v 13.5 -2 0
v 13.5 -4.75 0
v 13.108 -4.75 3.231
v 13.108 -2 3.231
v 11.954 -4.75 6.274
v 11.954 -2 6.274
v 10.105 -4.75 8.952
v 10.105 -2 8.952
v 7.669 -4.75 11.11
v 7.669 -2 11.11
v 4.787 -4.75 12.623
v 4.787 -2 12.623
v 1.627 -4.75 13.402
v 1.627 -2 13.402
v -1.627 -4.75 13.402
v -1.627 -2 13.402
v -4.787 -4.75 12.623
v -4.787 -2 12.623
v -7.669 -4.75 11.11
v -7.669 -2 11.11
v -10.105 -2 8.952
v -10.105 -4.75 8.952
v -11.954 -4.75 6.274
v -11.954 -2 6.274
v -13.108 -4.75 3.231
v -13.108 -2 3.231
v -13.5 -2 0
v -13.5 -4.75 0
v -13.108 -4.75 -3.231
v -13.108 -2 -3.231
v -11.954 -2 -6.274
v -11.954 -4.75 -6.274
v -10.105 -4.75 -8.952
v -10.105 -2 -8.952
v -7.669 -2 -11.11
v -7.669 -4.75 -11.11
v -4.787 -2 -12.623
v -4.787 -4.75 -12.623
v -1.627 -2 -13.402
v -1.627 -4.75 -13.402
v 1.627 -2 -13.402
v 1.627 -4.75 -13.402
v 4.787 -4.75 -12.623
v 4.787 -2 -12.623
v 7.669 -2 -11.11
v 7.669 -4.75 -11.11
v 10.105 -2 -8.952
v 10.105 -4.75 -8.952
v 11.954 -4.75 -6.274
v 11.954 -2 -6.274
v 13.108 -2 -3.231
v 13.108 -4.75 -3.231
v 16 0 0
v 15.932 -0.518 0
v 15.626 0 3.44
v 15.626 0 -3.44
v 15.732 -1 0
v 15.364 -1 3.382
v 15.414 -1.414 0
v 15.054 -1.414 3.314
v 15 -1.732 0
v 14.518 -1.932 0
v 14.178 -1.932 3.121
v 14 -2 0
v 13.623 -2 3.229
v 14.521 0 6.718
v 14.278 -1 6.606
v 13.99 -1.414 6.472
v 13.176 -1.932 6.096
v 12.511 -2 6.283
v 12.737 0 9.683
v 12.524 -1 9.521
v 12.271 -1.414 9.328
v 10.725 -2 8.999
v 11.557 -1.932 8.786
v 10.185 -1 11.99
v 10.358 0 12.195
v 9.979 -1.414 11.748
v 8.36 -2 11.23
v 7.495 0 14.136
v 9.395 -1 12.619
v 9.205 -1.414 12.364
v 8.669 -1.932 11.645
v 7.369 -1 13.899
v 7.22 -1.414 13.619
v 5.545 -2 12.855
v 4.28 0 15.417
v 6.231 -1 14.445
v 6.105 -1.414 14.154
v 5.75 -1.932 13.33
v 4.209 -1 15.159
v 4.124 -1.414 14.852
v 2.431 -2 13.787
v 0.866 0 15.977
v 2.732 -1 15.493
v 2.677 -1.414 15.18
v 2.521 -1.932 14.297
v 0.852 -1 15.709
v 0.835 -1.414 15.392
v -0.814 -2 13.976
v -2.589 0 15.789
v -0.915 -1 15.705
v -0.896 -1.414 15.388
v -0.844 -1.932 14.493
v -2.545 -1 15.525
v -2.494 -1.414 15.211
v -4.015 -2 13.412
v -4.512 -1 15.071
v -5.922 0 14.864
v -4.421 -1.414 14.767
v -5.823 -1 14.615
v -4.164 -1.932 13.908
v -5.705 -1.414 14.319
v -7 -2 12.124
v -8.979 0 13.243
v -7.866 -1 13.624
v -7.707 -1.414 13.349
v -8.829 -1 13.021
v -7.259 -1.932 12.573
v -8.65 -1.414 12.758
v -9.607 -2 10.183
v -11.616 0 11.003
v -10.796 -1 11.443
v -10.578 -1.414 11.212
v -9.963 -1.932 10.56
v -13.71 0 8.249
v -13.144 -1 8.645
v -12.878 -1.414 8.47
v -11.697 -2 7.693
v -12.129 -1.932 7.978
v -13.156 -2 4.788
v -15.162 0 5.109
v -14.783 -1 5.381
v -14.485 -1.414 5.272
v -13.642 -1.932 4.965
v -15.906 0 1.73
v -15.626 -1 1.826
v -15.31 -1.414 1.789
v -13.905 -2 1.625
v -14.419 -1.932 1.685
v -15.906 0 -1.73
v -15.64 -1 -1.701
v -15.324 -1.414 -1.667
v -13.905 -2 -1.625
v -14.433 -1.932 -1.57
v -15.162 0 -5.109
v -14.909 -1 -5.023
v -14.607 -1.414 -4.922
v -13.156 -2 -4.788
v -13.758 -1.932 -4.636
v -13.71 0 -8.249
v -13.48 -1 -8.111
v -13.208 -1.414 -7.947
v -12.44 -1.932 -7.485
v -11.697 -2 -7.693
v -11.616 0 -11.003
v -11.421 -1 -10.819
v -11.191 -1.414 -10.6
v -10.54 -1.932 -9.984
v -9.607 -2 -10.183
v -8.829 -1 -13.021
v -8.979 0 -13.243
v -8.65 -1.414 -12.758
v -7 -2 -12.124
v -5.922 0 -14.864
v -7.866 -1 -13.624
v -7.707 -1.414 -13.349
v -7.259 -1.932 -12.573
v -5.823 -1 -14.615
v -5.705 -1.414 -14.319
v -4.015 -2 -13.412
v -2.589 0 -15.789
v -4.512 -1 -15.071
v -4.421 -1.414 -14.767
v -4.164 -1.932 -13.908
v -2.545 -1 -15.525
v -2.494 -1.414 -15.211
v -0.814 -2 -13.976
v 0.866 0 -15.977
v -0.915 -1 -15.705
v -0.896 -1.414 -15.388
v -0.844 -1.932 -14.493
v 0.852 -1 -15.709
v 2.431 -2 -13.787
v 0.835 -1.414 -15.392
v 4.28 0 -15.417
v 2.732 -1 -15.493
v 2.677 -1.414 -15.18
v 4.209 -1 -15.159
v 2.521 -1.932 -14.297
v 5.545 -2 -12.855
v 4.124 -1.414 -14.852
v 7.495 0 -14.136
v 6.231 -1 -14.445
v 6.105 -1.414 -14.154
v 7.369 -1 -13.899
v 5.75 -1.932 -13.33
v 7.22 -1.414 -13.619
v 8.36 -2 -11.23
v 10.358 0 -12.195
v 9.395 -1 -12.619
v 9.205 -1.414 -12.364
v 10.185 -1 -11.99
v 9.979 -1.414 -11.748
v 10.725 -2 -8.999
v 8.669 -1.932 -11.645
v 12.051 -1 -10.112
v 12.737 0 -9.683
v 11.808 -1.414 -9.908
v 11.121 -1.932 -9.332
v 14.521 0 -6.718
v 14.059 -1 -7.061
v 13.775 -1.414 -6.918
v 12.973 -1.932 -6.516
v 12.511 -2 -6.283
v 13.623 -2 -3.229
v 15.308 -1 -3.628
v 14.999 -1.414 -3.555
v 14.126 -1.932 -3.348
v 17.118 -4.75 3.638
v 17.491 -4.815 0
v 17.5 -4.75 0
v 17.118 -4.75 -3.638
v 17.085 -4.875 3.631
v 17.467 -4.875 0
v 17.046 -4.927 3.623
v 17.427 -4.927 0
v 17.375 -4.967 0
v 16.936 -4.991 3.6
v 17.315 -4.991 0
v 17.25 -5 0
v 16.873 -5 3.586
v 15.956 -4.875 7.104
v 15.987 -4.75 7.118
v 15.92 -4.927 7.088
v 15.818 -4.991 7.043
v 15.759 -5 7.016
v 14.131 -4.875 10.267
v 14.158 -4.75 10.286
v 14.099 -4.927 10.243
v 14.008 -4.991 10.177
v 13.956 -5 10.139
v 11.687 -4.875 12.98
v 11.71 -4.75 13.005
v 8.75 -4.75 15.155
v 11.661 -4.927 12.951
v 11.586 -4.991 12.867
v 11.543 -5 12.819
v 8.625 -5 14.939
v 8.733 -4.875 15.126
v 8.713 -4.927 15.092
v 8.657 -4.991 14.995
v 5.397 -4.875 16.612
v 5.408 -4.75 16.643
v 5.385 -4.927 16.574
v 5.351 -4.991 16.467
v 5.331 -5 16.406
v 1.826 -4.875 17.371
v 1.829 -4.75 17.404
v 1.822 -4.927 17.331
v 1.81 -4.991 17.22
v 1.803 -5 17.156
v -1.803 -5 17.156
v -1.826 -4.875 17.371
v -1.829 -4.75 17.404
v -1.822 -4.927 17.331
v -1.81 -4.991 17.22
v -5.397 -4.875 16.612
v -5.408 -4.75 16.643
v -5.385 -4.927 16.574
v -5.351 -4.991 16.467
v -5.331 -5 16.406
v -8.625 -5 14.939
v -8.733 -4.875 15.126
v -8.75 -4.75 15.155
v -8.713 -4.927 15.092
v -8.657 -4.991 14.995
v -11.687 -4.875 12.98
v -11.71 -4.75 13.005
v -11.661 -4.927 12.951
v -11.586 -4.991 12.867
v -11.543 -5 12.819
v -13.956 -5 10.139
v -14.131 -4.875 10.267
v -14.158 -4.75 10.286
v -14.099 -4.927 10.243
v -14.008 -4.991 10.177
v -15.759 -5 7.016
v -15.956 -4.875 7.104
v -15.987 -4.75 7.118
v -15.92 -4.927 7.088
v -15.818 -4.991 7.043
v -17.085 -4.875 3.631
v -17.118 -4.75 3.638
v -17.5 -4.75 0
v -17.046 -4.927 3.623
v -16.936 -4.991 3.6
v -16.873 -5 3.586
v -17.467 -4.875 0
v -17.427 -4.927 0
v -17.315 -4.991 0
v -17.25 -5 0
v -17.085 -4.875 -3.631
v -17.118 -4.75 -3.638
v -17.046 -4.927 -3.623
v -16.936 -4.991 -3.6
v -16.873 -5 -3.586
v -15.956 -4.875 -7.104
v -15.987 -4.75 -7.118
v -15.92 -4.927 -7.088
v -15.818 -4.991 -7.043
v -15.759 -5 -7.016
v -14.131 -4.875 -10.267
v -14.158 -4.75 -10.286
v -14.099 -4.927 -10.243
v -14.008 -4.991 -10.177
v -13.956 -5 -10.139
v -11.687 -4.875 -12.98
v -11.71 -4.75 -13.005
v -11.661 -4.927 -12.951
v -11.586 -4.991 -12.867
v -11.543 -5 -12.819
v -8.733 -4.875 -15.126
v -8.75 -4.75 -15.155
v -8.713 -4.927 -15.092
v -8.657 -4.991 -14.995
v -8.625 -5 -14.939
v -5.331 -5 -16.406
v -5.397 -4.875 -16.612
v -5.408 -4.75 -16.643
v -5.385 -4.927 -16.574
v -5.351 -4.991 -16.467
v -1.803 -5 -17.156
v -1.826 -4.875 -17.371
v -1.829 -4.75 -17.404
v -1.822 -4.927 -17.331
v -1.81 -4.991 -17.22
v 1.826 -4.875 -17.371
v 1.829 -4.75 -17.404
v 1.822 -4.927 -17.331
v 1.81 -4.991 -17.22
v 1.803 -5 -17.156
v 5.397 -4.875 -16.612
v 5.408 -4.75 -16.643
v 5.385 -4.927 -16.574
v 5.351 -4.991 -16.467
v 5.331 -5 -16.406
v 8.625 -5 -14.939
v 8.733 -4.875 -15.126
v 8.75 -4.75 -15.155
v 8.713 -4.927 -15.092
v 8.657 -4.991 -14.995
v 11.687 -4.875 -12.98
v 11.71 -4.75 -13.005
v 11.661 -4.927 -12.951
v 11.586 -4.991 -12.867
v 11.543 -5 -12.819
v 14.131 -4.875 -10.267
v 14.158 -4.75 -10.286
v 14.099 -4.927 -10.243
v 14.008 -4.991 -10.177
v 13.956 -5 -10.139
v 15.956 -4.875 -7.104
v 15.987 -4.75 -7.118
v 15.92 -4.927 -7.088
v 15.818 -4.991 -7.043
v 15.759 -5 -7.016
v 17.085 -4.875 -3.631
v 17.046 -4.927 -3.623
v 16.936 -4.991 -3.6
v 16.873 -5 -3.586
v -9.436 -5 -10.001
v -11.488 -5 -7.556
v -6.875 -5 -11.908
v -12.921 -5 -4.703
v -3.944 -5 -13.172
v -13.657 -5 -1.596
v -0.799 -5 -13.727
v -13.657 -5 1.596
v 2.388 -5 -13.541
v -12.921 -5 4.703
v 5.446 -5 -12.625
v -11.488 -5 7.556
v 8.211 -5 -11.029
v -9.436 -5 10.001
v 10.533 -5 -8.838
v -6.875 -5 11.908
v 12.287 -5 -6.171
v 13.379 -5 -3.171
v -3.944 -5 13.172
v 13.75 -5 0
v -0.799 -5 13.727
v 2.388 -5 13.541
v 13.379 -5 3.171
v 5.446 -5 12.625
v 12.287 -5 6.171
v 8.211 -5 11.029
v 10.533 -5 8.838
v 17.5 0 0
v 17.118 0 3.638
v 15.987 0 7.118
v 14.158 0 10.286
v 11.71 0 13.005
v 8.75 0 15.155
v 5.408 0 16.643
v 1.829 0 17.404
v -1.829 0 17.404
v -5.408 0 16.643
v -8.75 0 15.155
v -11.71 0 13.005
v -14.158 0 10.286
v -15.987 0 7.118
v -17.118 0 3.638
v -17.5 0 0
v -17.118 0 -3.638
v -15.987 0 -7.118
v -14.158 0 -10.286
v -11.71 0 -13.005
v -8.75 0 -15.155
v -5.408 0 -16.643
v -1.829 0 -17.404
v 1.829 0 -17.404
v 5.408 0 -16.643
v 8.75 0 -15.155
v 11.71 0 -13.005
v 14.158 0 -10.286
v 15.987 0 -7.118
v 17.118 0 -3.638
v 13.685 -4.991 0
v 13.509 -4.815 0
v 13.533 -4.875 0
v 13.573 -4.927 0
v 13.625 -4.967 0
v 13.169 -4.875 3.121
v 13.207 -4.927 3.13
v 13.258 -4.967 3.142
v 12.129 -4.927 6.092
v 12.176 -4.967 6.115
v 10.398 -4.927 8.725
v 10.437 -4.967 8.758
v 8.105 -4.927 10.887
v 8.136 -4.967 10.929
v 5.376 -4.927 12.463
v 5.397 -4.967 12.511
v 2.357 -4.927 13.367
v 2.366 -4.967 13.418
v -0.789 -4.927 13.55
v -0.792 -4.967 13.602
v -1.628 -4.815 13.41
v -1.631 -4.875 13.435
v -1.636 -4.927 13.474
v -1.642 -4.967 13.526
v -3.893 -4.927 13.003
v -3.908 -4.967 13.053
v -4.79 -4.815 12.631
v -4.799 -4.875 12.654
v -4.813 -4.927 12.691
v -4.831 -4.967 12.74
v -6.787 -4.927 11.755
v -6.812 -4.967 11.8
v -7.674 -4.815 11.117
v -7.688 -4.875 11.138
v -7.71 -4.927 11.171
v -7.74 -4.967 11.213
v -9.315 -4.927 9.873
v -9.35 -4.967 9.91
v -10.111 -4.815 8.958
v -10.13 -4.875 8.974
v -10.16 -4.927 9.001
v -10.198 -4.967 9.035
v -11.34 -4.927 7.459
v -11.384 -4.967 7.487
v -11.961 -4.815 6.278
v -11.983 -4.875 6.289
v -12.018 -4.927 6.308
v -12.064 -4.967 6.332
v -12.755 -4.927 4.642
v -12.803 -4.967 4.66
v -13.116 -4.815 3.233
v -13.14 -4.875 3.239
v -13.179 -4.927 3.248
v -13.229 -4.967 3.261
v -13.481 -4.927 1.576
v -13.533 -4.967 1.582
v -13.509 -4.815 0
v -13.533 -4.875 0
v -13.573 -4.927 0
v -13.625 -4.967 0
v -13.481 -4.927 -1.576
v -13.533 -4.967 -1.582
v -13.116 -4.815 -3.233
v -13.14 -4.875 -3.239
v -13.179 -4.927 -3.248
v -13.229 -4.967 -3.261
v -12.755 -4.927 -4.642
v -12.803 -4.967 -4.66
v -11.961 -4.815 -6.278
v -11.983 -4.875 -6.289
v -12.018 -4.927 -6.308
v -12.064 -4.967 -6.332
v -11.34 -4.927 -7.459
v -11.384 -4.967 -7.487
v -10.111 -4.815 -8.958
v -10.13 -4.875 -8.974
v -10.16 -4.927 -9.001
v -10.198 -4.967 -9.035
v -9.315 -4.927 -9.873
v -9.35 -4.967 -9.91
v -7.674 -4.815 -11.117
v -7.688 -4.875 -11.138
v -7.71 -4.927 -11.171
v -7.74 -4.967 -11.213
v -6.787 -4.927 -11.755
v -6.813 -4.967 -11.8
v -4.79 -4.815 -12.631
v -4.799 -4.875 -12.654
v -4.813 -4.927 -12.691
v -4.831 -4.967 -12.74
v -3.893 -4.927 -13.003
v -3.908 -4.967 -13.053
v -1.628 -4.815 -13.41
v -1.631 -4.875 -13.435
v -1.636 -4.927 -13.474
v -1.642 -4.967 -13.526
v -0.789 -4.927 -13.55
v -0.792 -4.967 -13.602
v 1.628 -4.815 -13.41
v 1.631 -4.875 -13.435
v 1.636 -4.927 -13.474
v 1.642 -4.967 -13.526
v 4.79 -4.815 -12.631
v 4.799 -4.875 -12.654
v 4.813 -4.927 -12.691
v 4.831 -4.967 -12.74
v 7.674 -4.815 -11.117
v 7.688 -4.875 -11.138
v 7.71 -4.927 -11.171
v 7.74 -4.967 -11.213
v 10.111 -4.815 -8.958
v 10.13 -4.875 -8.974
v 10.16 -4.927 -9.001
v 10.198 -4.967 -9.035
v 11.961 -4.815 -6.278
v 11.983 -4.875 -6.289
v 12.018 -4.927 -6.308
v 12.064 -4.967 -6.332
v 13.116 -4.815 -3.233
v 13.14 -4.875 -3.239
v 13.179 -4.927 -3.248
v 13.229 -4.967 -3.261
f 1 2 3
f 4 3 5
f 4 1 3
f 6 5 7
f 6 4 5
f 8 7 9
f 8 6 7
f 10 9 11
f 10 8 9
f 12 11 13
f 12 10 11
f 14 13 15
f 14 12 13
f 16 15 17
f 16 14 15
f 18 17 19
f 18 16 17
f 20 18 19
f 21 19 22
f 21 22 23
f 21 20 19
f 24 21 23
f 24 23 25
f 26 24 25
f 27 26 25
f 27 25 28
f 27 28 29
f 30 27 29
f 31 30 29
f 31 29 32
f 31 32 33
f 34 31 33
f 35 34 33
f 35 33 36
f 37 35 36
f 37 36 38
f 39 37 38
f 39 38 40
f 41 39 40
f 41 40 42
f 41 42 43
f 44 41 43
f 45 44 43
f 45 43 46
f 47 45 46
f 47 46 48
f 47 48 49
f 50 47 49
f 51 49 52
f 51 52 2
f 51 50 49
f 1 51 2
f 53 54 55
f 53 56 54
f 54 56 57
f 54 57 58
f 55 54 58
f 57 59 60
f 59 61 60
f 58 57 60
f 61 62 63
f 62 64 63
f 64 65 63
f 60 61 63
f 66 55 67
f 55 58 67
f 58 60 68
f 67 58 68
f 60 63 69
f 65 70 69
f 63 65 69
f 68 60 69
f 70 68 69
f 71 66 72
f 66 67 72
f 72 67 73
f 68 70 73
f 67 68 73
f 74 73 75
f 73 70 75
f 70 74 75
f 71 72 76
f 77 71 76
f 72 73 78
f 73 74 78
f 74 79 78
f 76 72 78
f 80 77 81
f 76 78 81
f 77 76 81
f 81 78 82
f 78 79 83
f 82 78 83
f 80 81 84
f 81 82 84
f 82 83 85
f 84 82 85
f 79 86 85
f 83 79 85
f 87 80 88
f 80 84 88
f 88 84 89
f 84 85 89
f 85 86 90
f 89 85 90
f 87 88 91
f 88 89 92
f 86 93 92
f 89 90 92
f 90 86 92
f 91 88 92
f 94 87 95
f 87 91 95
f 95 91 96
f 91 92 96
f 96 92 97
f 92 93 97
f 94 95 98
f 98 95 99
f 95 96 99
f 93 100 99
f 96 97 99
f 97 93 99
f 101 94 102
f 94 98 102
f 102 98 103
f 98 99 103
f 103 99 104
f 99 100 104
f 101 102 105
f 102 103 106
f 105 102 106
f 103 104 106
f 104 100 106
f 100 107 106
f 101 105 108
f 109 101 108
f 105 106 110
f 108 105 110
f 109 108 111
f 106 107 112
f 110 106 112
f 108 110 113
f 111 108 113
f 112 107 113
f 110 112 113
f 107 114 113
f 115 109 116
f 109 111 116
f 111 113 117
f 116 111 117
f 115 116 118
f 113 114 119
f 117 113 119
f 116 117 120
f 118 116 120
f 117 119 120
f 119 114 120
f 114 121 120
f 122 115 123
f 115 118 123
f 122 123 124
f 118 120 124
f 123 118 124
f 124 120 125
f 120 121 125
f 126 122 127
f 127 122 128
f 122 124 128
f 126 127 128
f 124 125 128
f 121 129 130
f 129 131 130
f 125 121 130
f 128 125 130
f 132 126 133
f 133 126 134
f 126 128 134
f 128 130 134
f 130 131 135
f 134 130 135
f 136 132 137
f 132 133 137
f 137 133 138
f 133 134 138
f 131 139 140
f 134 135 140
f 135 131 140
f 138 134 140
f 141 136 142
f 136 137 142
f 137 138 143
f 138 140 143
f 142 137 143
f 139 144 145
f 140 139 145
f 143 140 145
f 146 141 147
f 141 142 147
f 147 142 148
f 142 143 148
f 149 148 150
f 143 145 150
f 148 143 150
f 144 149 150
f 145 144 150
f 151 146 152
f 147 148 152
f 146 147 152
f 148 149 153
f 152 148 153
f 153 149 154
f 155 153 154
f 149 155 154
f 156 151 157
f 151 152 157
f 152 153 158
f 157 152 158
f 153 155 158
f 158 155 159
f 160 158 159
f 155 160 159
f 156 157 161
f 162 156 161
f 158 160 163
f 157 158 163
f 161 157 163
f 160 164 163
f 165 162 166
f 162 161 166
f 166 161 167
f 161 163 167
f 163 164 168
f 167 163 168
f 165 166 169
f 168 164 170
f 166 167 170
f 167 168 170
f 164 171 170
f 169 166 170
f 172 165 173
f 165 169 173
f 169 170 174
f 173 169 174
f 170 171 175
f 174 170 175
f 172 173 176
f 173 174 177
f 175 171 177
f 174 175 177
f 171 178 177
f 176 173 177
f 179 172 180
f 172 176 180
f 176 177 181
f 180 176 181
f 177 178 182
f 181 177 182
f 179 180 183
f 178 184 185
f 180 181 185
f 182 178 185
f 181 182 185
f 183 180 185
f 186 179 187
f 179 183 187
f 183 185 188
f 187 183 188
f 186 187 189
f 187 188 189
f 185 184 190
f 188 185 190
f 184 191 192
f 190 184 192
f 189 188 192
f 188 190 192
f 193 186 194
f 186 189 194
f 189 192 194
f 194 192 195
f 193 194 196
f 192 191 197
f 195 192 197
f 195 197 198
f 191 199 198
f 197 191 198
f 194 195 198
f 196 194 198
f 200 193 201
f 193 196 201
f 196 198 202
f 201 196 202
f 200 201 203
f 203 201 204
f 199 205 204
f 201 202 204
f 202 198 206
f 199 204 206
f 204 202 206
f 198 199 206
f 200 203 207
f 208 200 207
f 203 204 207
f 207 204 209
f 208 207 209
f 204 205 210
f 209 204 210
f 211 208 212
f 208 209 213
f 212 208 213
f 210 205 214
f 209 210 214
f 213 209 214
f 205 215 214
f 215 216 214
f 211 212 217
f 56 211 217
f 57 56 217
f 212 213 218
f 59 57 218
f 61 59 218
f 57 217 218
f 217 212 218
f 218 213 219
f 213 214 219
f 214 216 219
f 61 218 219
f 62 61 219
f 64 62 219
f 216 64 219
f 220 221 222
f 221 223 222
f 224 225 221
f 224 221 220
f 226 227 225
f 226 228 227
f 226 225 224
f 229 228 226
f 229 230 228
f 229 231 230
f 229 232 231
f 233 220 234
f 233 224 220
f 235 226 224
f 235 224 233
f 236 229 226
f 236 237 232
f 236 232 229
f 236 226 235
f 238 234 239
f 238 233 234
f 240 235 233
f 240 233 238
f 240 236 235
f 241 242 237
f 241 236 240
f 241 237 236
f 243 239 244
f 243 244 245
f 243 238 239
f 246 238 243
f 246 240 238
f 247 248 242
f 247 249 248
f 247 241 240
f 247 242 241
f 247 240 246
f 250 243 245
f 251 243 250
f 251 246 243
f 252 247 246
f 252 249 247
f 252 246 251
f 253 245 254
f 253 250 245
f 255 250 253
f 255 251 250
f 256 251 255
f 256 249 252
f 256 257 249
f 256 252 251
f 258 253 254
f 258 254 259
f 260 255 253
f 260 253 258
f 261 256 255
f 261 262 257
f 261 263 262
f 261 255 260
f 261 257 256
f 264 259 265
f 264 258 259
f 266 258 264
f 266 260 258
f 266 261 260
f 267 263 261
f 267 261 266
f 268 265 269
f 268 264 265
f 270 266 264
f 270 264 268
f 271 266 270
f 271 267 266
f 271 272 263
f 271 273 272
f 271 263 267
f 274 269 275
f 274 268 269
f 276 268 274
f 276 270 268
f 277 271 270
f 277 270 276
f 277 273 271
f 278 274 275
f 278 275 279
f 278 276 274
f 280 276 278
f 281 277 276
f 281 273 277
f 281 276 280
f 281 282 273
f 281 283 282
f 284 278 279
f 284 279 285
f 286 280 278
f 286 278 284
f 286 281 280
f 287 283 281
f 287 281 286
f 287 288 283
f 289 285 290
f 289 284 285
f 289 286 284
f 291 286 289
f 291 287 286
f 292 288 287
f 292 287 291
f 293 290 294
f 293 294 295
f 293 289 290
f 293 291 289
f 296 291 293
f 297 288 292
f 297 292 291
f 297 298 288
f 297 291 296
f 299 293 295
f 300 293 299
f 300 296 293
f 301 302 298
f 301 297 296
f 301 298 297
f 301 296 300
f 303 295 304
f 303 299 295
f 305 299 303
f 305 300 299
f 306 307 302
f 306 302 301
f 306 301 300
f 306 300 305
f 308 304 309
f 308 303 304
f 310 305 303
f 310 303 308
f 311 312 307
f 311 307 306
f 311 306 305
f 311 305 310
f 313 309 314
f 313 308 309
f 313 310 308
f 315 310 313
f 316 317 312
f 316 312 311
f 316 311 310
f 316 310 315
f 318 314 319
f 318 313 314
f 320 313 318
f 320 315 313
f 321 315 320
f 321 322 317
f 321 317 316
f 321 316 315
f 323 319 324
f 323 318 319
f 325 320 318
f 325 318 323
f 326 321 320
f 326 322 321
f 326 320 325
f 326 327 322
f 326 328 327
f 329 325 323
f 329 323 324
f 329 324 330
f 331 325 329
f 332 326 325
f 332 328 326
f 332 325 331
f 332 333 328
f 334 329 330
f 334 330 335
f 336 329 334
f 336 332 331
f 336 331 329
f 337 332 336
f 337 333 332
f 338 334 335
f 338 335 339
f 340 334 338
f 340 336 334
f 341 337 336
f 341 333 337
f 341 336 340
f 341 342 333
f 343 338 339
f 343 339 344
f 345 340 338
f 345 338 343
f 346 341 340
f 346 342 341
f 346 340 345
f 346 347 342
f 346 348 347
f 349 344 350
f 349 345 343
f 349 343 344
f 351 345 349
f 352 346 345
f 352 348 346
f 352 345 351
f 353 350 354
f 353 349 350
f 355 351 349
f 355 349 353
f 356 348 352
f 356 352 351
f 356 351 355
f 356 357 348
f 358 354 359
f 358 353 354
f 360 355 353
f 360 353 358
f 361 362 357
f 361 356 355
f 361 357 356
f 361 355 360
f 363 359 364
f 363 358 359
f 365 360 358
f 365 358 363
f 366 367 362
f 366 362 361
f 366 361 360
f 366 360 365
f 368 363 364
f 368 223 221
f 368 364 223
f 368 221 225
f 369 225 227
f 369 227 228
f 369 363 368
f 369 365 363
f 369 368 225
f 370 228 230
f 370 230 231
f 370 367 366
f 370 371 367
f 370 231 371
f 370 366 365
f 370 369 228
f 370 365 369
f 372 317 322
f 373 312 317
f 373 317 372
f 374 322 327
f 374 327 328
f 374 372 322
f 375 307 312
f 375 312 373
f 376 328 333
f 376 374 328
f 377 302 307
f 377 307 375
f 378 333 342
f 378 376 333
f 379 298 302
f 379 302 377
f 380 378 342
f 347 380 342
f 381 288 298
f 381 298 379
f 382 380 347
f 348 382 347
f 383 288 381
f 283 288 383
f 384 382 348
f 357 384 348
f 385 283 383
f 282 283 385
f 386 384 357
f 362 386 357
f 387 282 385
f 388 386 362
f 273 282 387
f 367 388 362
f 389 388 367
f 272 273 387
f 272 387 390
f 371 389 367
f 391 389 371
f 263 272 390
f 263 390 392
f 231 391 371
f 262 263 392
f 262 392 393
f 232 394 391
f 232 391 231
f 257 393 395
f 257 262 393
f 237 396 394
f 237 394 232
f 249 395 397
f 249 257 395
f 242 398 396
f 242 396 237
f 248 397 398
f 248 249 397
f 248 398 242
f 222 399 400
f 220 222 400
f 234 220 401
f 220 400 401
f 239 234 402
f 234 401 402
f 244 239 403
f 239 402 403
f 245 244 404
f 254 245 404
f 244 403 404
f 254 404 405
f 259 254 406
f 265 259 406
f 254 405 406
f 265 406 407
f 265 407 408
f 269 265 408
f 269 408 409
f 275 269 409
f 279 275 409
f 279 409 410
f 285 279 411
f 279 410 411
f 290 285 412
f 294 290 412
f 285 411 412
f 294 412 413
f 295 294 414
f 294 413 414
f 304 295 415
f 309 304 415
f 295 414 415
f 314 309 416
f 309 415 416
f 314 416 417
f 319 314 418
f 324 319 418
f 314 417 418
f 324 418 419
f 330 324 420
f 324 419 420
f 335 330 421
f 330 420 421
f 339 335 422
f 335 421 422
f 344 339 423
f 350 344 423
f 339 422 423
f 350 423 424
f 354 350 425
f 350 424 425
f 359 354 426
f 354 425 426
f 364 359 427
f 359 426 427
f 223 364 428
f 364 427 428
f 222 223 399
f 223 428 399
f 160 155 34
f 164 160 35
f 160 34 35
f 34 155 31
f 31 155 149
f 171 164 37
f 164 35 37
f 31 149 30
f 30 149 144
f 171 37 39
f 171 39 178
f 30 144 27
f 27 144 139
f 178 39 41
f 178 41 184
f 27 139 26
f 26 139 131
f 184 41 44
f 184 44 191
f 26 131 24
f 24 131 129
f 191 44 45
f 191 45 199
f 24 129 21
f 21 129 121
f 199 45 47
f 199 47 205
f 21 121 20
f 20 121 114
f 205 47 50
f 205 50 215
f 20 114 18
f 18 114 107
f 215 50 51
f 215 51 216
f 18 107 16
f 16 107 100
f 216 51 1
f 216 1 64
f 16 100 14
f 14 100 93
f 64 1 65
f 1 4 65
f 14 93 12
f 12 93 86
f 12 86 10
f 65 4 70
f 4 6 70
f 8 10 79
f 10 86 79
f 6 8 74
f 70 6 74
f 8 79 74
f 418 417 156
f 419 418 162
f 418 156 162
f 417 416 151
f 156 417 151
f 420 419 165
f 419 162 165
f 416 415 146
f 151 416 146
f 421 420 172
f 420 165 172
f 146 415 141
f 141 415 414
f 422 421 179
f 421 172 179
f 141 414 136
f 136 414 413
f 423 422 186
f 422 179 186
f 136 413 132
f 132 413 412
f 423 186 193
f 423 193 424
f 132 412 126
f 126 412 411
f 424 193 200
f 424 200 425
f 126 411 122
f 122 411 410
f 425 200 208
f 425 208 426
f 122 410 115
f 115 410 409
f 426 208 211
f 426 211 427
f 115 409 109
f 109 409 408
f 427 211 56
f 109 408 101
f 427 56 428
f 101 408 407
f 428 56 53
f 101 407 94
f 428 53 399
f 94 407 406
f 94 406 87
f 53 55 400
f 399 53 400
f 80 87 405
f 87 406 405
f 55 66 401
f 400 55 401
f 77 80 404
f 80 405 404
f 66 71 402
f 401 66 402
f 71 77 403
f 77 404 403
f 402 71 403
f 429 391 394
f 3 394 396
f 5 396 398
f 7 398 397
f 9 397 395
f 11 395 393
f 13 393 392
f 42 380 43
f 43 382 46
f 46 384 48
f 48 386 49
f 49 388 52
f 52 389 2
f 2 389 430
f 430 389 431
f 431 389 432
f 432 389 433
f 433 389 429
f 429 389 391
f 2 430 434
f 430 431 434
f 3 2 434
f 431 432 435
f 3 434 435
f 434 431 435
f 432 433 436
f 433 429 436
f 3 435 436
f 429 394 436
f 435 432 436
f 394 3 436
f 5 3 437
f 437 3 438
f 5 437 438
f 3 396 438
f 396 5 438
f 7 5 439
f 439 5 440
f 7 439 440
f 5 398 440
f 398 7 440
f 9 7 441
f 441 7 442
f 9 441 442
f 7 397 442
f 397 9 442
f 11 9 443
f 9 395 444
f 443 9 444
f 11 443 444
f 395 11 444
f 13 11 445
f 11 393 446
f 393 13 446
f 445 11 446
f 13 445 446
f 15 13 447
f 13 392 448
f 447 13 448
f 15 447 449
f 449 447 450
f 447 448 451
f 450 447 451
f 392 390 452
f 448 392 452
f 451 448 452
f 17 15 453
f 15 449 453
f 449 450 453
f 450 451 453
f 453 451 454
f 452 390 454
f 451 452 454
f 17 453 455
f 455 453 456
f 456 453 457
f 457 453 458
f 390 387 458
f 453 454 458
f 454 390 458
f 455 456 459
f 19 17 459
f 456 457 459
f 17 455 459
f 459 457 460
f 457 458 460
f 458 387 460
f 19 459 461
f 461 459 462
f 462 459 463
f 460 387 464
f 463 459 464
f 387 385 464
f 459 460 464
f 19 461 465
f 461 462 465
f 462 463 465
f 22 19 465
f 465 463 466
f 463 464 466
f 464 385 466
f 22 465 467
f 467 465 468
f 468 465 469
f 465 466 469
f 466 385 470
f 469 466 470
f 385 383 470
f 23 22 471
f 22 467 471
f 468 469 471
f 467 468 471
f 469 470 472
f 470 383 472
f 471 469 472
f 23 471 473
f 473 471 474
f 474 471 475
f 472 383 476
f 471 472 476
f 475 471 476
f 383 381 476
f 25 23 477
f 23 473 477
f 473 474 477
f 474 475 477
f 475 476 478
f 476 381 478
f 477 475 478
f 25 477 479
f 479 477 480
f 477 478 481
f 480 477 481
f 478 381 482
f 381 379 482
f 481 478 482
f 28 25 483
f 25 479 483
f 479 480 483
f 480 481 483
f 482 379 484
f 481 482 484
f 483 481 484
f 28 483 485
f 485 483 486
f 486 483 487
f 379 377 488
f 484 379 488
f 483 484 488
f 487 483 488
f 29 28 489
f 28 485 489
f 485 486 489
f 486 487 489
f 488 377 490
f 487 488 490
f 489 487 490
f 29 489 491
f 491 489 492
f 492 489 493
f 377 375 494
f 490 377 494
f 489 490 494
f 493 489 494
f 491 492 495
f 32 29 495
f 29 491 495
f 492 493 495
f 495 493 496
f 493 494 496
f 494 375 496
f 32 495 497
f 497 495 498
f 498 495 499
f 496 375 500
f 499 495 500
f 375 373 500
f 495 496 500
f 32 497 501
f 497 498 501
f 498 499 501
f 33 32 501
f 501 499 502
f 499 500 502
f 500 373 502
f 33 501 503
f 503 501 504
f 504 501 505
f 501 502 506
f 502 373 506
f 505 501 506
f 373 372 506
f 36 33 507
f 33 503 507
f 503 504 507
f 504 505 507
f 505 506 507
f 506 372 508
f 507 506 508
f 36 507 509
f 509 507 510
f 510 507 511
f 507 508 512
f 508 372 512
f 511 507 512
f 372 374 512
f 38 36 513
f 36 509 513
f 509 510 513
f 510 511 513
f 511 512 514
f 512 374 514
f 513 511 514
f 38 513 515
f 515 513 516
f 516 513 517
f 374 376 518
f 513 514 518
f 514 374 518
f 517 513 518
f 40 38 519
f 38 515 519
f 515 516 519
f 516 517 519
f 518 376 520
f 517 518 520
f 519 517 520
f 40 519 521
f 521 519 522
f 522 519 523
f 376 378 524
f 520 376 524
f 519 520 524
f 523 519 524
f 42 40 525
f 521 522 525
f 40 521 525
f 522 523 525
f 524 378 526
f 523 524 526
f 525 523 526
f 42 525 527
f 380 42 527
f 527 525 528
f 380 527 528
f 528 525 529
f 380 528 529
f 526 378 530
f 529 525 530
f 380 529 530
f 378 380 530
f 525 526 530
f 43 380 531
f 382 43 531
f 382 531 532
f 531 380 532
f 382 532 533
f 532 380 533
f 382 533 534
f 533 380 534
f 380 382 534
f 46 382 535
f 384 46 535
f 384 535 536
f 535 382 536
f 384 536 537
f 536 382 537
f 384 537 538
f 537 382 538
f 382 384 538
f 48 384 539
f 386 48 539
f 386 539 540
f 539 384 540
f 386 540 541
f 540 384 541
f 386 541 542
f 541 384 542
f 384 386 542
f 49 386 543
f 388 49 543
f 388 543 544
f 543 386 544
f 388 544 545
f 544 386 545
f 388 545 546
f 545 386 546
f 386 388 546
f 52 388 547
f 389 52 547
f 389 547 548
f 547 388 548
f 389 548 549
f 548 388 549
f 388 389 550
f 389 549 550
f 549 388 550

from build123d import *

# Parameters (mm, degrees)
F0_R     = 17.5
F0_R_2   = 13.5
F1_DEPTH = 5
F2_R     = 0.25
F3_R     = 16
F4_DEPTH = 2
F5_R     = 1.99999


# Not quite as in the source:
# - a fillet or chamfer is up to 0.001 mm smaller than in the source, because OpenCascade refuses the exact size


with BuildPart() as f1:
    # F0 (on Front) → F1 (new body)
    with BuildSketch(Plane.XZ):
        Circle(F0_R)
        Circle(F0_R_2, mode=Mode.SUBTRACT)
    extrude(amount=F1_DEPTH)

    # F2
    f2_edges = [f1.edges().sort_by_distance(p)[0] for p in [
        (-17.5, -5, 0),
        (-13.5, -5, 0),
    ]]
    fillet(f2_edges, radius=F2_R)

    # F3 (on Front) → F4 (cut)
    with BuildSketch(Plane.XZ):
        Circle(F3_R)
    extrude(amount=F4_DEPTH, mode=Mode.SUBTRACT)

    # F5 (radius 2 in the source; OpenCascade refuses exactly that, so slightly less here)
    f5_edges = [f1.edges().sort_by_distance(p)[0] for p in [
        (-16, -2, 0),
    ]]
    fillet(f5_edges, radius=F5_R)


solid = f1.part
